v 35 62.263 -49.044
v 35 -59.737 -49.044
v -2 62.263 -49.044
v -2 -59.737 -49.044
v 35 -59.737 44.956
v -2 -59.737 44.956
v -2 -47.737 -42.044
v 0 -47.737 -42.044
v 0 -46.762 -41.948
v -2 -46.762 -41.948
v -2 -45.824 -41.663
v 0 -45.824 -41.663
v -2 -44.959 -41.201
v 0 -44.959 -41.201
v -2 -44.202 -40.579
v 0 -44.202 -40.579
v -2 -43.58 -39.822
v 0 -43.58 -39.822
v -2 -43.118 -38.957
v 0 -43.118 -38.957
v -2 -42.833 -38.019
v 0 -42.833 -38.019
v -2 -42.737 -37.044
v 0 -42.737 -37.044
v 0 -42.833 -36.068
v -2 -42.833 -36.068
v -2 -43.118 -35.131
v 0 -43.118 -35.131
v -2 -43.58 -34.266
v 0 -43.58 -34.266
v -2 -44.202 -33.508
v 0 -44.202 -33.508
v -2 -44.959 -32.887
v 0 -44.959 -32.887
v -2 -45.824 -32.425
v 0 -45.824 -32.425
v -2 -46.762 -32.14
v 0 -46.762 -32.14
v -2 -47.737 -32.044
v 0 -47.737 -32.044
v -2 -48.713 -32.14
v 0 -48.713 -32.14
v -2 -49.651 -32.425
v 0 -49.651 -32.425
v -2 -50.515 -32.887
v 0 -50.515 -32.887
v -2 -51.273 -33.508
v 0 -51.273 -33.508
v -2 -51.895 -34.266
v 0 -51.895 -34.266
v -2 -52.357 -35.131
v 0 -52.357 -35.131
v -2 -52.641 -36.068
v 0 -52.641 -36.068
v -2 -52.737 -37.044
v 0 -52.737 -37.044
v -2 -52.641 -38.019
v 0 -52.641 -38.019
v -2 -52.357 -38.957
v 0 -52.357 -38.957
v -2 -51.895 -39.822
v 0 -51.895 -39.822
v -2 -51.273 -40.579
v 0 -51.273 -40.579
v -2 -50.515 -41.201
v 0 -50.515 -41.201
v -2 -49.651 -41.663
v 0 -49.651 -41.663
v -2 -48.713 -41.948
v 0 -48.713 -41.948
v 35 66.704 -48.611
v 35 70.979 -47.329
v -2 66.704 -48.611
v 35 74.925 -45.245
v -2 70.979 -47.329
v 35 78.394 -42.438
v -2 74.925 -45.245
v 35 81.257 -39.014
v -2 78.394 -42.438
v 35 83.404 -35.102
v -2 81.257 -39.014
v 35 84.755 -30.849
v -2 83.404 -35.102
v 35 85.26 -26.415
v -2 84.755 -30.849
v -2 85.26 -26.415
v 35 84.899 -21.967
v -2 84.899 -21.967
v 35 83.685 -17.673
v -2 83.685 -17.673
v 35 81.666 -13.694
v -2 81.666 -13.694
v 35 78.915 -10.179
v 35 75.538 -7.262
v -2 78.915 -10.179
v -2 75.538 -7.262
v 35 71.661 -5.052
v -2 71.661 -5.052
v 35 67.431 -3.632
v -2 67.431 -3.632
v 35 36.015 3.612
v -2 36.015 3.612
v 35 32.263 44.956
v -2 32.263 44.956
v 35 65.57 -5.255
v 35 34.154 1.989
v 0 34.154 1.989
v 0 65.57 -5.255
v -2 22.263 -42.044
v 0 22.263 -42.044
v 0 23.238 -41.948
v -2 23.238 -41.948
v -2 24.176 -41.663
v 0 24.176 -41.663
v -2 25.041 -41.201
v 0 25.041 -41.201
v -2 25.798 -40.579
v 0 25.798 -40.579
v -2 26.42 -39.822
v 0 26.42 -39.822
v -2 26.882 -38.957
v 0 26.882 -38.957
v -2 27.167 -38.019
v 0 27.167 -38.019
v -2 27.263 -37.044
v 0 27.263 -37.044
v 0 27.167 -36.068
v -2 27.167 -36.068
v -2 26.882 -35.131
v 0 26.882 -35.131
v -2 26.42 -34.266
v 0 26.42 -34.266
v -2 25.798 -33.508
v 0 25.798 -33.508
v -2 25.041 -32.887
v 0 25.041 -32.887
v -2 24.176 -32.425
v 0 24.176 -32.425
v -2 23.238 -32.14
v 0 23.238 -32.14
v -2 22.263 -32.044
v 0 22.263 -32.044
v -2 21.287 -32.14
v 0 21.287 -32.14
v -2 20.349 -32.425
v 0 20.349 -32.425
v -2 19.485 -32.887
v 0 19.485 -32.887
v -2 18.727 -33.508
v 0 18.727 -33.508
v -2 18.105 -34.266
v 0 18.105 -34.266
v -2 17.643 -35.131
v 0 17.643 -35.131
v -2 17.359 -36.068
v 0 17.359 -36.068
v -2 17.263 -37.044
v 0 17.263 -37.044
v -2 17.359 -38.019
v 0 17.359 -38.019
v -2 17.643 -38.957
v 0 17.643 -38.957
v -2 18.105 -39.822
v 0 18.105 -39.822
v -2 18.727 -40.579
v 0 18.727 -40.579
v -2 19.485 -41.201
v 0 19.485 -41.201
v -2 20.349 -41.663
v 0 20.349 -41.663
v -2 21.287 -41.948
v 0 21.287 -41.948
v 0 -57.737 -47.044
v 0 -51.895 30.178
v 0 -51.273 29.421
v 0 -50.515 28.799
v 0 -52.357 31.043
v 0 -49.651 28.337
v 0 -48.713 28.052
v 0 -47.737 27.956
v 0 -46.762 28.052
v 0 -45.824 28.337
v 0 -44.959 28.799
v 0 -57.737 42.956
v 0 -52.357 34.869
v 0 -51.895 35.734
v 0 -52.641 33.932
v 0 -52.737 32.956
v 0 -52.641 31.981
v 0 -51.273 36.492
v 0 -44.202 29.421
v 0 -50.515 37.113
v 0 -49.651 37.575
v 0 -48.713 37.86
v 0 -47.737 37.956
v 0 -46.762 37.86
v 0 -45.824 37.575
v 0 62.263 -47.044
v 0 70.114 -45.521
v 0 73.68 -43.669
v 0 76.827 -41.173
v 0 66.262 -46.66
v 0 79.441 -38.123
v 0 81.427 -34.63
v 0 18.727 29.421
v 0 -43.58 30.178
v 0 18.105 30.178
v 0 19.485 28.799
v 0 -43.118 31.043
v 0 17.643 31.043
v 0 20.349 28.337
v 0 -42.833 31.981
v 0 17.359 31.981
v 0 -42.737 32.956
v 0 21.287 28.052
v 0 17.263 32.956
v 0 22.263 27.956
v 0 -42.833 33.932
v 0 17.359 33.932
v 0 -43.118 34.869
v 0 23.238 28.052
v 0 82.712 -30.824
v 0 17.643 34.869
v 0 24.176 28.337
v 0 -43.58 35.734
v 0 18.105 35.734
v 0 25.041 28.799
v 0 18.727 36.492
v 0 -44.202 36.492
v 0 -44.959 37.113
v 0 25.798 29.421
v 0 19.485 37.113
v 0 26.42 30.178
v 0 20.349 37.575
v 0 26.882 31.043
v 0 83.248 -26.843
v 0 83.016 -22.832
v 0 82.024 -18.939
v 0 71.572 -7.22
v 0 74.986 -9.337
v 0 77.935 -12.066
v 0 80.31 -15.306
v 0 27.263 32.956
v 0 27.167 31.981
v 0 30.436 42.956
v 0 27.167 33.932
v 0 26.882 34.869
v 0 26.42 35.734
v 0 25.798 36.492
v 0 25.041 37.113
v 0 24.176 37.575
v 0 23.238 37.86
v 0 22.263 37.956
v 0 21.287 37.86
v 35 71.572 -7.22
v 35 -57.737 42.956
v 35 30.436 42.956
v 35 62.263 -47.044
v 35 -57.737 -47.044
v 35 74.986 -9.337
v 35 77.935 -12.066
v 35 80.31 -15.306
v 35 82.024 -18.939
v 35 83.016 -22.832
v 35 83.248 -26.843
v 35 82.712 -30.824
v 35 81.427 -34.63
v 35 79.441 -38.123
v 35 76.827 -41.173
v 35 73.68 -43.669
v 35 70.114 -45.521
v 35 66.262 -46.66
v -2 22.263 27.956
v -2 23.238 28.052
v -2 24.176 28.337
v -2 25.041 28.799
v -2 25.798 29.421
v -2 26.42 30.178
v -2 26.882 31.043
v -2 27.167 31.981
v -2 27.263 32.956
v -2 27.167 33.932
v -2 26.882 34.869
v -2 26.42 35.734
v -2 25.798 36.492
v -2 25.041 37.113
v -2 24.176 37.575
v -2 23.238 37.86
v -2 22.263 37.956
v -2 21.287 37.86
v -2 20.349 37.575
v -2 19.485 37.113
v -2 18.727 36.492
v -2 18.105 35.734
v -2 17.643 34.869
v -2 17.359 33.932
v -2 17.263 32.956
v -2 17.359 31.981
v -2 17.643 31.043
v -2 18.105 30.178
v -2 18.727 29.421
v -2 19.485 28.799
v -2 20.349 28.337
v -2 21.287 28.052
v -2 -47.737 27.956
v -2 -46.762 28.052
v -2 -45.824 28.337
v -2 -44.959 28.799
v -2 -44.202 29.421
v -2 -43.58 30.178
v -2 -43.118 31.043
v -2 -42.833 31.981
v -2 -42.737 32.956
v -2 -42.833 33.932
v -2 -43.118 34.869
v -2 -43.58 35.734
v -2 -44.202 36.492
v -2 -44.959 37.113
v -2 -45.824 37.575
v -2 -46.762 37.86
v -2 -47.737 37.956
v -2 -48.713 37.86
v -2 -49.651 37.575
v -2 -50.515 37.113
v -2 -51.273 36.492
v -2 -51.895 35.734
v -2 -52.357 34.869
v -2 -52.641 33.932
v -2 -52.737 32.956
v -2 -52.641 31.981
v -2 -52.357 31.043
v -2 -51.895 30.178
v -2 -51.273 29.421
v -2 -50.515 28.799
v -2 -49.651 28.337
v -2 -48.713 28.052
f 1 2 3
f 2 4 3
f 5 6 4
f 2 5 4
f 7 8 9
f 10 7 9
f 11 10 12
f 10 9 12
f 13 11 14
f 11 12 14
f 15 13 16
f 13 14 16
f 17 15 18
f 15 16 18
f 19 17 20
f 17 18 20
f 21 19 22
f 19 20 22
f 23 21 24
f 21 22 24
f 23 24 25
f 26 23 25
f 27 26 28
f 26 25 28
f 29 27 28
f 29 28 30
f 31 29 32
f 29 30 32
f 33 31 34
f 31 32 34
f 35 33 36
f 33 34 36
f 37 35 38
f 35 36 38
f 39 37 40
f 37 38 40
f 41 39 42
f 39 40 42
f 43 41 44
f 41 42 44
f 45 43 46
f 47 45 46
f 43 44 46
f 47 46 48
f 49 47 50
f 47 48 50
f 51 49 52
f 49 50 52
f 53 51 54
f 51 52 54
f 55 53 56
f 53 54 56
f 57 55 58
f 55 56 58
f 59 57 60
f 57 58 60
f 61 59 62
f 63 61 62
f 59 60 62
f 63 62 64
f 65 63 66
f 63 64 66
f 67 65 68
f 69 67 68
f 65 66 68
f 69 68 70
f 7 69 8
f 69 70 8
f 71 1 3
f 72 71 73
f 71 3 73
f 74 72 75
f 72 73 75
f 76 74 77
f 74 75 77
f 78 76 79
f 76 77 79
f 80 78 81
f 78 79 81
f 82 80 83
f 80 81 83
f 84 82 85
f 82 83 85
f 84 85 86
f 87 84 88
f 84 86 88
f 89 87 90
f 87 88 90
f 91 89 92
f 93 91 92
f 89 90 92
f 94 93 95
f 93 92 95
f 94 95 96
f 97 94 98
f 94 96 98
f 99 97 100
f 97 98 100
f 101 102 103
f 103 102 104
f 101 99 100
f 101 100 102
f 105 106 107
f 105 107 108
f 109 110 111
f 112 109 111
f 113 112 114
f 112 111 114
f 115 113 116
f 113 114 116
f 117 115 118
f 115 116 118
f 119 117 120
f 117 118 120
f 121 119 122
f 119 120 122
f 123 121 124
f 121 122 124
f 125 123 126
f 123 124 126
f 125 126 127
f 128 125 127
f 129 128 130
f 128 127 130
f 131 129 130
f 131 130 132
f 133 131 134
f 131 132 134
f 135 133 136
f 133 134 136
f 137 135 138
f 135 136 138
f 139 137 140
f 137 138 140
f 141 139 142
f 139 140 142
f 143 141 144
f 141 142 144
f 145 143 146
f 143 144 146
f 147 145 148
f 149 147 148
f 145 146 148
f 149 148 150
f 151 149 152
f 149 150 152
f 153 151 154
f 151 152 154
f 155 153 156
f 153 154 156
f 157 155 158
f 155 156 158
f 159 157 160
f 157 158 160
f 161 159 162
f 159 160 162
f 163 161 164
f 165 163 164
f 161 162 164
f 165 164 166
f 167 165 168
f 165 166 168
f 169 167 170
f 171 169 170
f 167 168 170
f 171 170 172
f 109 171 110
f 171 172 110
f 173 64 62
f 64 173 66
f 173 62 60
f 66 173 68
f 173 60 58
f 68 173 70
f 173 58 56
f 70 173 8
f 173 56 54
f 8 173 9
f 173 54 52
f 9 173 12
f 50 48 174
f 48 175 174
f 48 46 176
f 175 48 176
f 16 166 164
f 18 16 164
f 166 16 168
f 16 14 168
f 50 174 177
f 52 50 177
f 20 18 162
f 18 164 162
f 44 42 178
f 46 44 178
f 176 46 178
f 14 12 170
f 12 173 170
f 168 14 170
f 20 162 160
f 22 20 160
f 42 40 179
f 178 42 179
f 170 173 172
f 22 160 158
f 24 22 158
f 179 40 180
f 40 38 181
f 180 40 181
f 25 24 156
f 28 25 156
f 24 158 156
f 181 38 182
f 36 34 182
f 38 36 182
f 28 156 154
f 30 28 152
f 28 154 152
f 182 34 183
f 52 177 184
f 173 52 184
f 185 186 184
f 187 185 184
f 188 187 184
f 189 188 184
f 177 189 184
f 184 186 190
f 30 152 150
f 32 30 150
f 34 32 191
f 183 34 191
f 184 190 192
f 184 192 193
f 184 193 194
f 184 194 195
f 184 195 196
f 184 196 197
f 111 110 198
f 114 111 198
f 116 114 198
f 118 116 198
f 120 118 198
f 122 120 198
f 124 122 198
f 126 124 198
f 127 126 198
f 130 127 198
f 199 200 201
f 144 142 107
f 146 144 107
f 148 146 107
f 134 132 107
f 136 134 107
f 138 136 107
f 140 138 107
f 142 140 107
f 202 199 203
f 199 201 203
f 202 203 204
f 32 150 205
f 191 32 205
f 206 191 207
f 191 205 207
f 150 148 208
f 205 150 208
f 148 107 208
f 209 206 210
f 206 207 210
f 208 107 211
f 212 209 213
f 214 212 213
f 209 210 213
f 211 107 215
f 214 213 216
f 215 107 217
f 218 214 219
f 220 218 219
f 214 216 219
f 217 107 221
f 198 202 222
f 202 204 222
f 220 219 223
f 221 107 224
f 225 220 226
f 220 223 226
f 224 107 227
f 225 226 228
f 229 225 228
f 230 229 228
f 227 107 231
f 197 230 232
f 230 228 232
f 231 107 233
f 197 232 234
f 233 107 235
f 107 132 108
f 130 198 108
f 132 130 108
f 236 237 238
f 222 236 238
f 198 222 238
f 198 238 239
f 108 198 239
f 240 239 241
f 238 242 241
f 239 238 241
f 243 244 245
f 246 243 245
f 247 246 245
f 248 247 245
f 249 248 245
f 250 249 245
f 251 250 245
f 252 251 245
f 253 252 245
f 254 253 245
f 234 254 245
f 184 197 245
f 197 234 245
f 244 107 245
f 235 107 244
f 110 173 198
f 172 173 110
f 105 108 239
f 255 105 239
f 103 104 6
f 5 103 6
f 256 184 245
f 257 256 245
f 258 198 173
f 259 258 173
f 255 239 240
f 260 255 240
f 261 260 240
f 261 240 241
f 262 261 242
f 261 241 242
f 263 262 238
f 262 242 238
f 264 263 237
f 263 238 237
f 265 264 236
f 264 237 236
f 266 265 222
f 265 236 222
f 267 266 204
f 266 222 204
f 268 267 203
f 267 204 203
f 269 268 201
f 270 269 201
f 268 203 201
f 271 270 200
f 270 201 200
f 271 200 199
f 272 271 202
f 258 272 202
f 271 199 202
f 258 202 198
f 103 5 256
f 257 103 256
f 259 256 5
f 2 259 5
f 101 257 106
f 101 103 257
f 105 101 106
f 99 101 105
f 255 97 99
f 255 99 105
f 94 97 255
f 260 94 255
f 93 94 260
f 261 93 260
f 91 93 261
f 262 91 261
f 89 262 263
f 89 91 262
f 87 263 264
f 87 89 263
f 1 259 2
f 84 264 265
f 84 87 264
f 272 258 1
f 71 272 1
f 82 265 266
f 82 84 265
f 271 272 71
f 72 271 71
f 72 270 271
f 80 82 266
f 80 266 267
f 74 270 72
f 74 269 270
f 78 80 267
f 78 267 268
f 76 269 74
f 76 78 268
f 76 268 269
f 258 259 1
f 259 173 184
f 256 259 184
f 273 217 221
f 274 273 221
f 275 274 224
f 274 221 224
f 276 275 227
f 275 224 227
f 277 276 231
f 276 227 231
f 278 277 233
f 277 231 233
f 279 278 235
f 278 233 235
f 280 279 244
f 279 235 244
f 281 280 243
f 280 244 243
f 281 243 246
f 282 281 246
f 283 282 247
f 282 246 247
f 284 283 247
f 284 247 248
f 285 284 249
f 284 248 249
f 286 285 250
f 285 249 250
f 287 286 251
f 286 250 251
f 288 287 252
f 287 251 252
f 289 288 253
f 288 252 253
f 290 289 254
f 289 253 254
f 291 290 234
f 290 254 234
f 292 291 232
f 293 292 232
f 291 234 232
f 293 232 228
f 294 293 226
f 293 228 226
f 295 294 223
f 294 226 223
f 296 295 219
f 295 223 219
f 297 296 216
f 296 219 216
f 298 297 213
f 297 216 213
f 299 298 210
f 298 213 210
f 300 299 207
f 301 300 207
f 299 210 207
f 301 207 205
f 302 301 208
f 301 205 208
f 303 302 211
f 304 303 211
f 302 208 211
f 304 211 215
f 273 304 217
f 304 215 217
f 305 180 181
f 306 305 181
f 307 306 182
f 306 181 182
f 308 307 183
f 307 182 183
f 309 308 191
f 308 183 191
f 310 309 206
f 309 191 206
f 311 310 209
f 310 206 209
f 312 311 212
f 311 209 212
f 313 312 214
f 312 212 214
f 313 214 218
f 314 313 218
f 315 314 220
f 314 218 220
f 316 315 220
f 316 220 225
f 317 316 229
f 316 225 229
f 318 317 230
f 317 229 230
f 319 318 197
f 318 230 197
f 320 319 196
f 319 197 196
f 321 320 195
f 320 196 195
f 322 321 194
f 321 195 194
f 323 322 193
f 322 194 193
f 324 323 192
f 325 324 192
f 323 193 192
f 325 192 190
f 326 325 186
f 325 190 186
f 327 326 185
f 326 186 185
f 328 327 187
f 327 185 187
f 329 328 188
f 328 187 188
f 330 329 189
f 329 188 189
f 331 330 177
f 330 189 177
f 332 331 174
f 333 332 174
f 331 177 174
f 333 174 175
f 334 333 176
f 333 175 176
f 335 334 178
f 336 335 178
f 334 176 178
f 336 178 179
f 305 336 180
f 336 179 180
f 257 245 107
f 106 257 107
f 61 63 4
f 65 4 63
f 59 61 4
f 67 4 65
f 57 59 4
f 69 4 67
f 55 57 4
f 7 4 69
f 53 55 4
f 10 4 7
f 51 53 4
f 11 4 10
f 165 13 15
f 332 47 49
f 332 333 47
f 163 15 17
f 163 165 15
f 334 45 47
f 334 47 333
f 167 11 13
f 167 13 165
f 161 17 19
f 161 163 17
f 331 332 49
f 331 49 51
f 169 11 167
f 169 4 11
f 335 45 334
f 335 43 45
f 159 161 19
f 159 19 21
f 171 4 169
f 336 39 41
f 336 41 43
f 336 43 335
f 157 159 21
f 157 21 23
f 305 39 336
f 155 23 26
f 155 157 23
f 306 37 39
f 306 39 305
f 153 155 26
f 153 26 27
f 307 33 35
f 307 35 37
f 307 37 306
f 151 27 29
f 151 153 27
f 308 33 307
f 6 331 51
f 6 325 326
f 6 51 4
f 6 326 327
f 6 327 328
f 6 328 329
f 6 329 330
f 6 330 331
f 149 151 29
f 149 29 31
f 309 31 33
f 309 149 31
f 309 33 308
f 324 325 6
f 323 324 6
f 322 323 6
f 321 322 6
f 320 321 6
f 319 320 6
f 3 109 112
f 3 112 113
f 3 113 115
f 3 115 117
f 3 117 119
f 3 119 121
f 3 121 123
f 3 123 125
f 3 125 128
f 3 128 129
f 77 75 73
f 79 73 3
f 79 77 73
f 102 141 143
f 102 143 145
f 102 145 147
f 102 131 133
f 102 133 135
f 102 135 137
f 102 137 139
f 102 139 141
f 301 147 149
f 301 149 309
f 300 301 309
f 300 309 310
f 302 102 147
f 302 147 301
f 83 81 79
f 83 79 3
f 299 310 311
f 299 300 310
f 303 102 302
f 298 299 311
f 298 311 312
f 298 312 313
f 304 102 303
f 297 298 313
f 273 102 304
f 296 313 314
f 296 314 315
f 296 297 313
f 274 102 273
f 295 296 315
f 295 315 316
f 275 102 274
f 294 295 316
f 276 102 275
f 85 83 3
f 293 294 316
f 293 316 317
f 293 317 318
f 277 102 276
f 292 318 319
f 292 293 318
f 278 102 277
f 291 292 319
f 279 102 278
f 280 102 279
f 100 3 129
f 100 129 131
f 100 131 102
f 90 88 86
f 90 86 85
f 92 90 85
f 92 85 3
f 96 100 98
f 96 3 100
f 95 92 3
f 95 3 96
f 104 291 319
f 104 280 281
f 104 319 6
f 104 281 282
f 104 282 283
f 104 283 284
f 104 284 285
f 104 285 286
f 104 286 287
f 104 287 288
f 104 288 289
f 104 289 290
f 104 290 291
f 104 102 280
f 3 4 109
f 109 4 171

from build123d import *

# Parameters (mm, degrees)
SKETCH1_R           = 5
BOSS_EXTRUDE1_DEPTH = 2
EXTRUDE_THIN1_START = 35
EXTRUDE_THIN1_DEPTH = 35


with BuildPart() as part:
    # Sketch1 → Boss-Extrude1 (new body)
    with BuildSketch(Plane(origin=(0, 0, 0), x_dir=(0, 0, -1), z_dir=(1, 0, 0))):
        with BuildLine():
            Line((49.043932947, -59.7371598), (-44.956067053, -59.7371598))
            Line((-44.956067053, -59.7371598), (-44.956067053, 32.2628402))
            Line((-44.956067053, 32.2628402), (-3.612044261, 36.014733483))
            Line((-3.612044261, 36.014733483), (3.632035406, 67.43070713))
            ThreePointArc((3.632035406, 67.43070713), (28.644544082, 85.115341633), (49.043932947, 62.2628402))
            Line((49.043932947, 62.2628402), (49.043932947, -59.7371598))
        make_face()
        with Locations((37.043932947, 22.2628402)):
            Circle(SKETCH1_R, mode=Mode.SUBTRACT)
        with Locations((37.043932947, -47.7371598)):
            Circle(SKETCH1_R, mode=Mode.SUBTRACT)
        with Locations((-32.956067053, -47.7371598)):
            Circle(SKETCH1_R, mode=Mode.SUBTRACT)
        with Locations((-32.956067053, 22.2628402)):
            Circle(SKETCH1_R, mode=Mode.SUBTRACT)
    extrude(amount=-BOSS_EXTRUDE1_DEPTH)

    # Sketch2 → Extrude-Thin1 (add)
    # profile 1 of 2: a face of its own
    with BuildSketch(Plane(origin=(0, 0, 0), x_dir=(0, 0, -1), z_dir=(1, 0, 0)).offset(EXTRUDE_THIN1_START)):
        with BuildLine():
            Line((-3.612044261, 36.014733483), (3.632035406, 67.43070713))
            ThreePointArc((3.632035406, 67.43070713), (28.644544082, 85.115341633), (49.043932947, 62.2628402))
            Line((49.043932947, 62.2628402), (49.043932947, -59.7371598))
            Line((49.043932947, -59.7371598), (-44.956067053, -59.7371598))
            Line((-44.956067053, -59.7371598), (-44.956067053, 32.2628402))
            Line((-44.956067053, 32.2628402), (-42.956067053, 32.2628402))
            Line((-42.956067053, 32.2628402), (-42.956067053, -57.7371598))
            Line((-42.956067053, -57.7371598), (47.043932947, -57.7371598))
            Line((47.043932947, -57.7371598), (47.043932947, 62.2628402))
            ThreePointArc((47.043932947, 62.2628402), (28.418403983, 83.128167595), (5.580896061, 66.981327397))
            Line((5.580896061, 66.981327397), (-1.663183605, 35.56535375))
            Line((-1.663183605, 35.56535375), (-3.612044261, 36.014733483))
        make_face()
    # profile 2 of 2: a face of its own
    with BuildSketch(Plane(origin=(0, 0, 0), x_dir=(0, 0, -1), z_dir=(1, 0, 0)).offset(EXTRUDE_THIN1_START)):
        with BuildLine():
            Line((49.043932947, 62.2628402), (49.043932947, -59.7371598))
            Line((49.043932947, -59.7371598), (-44.956067053, -59.7371598))
            Line((-44.956067053, -59.7371598), (-44.956067053, 32.2628402))
            Line((-44.956067053, 32.2628402), (-3.612044261, 36.014733483))
            Line((-3.612044261, 36.014733483), (3.326726289, 66.10664892))
            Line((3.326726289, 66.10664892), (5.362716863, 72.326999445))
            ThreePointArc((5.362716863, 72.326999445), (31.207847648, 84.675648702), (49.043932947, 62.2628402))
        make_face()
        with BuildLine():
            Line((47.043932947, 62.2628402), (47.043932947, -57.7371598))
            Line((47.043932947, -57.7371598), (-42.956067053, -57.7371598))
            Line((-42.956067053, -57.7371598), (-42.956067053, 30.436118145))
            Line((-42.956067053, 30.436118145), (-1.988660061, 34.153834244))
            Line((-1.988660061, 34.153834244), (5.255419606, 65.569807891))
            Line((5.255419606, 65.569807891), (7.219966056, 71.571882604))
            ThreePointArc((7.219966056, 71.571882604), (30.82392747, 82.711596944), (47.043932947, 62.2628402))
        make_face(mode=Mode.SUBTRACT)
    extrude(amount=-EXTRUDE_THIN1_DEPTH)


solid = part.part
